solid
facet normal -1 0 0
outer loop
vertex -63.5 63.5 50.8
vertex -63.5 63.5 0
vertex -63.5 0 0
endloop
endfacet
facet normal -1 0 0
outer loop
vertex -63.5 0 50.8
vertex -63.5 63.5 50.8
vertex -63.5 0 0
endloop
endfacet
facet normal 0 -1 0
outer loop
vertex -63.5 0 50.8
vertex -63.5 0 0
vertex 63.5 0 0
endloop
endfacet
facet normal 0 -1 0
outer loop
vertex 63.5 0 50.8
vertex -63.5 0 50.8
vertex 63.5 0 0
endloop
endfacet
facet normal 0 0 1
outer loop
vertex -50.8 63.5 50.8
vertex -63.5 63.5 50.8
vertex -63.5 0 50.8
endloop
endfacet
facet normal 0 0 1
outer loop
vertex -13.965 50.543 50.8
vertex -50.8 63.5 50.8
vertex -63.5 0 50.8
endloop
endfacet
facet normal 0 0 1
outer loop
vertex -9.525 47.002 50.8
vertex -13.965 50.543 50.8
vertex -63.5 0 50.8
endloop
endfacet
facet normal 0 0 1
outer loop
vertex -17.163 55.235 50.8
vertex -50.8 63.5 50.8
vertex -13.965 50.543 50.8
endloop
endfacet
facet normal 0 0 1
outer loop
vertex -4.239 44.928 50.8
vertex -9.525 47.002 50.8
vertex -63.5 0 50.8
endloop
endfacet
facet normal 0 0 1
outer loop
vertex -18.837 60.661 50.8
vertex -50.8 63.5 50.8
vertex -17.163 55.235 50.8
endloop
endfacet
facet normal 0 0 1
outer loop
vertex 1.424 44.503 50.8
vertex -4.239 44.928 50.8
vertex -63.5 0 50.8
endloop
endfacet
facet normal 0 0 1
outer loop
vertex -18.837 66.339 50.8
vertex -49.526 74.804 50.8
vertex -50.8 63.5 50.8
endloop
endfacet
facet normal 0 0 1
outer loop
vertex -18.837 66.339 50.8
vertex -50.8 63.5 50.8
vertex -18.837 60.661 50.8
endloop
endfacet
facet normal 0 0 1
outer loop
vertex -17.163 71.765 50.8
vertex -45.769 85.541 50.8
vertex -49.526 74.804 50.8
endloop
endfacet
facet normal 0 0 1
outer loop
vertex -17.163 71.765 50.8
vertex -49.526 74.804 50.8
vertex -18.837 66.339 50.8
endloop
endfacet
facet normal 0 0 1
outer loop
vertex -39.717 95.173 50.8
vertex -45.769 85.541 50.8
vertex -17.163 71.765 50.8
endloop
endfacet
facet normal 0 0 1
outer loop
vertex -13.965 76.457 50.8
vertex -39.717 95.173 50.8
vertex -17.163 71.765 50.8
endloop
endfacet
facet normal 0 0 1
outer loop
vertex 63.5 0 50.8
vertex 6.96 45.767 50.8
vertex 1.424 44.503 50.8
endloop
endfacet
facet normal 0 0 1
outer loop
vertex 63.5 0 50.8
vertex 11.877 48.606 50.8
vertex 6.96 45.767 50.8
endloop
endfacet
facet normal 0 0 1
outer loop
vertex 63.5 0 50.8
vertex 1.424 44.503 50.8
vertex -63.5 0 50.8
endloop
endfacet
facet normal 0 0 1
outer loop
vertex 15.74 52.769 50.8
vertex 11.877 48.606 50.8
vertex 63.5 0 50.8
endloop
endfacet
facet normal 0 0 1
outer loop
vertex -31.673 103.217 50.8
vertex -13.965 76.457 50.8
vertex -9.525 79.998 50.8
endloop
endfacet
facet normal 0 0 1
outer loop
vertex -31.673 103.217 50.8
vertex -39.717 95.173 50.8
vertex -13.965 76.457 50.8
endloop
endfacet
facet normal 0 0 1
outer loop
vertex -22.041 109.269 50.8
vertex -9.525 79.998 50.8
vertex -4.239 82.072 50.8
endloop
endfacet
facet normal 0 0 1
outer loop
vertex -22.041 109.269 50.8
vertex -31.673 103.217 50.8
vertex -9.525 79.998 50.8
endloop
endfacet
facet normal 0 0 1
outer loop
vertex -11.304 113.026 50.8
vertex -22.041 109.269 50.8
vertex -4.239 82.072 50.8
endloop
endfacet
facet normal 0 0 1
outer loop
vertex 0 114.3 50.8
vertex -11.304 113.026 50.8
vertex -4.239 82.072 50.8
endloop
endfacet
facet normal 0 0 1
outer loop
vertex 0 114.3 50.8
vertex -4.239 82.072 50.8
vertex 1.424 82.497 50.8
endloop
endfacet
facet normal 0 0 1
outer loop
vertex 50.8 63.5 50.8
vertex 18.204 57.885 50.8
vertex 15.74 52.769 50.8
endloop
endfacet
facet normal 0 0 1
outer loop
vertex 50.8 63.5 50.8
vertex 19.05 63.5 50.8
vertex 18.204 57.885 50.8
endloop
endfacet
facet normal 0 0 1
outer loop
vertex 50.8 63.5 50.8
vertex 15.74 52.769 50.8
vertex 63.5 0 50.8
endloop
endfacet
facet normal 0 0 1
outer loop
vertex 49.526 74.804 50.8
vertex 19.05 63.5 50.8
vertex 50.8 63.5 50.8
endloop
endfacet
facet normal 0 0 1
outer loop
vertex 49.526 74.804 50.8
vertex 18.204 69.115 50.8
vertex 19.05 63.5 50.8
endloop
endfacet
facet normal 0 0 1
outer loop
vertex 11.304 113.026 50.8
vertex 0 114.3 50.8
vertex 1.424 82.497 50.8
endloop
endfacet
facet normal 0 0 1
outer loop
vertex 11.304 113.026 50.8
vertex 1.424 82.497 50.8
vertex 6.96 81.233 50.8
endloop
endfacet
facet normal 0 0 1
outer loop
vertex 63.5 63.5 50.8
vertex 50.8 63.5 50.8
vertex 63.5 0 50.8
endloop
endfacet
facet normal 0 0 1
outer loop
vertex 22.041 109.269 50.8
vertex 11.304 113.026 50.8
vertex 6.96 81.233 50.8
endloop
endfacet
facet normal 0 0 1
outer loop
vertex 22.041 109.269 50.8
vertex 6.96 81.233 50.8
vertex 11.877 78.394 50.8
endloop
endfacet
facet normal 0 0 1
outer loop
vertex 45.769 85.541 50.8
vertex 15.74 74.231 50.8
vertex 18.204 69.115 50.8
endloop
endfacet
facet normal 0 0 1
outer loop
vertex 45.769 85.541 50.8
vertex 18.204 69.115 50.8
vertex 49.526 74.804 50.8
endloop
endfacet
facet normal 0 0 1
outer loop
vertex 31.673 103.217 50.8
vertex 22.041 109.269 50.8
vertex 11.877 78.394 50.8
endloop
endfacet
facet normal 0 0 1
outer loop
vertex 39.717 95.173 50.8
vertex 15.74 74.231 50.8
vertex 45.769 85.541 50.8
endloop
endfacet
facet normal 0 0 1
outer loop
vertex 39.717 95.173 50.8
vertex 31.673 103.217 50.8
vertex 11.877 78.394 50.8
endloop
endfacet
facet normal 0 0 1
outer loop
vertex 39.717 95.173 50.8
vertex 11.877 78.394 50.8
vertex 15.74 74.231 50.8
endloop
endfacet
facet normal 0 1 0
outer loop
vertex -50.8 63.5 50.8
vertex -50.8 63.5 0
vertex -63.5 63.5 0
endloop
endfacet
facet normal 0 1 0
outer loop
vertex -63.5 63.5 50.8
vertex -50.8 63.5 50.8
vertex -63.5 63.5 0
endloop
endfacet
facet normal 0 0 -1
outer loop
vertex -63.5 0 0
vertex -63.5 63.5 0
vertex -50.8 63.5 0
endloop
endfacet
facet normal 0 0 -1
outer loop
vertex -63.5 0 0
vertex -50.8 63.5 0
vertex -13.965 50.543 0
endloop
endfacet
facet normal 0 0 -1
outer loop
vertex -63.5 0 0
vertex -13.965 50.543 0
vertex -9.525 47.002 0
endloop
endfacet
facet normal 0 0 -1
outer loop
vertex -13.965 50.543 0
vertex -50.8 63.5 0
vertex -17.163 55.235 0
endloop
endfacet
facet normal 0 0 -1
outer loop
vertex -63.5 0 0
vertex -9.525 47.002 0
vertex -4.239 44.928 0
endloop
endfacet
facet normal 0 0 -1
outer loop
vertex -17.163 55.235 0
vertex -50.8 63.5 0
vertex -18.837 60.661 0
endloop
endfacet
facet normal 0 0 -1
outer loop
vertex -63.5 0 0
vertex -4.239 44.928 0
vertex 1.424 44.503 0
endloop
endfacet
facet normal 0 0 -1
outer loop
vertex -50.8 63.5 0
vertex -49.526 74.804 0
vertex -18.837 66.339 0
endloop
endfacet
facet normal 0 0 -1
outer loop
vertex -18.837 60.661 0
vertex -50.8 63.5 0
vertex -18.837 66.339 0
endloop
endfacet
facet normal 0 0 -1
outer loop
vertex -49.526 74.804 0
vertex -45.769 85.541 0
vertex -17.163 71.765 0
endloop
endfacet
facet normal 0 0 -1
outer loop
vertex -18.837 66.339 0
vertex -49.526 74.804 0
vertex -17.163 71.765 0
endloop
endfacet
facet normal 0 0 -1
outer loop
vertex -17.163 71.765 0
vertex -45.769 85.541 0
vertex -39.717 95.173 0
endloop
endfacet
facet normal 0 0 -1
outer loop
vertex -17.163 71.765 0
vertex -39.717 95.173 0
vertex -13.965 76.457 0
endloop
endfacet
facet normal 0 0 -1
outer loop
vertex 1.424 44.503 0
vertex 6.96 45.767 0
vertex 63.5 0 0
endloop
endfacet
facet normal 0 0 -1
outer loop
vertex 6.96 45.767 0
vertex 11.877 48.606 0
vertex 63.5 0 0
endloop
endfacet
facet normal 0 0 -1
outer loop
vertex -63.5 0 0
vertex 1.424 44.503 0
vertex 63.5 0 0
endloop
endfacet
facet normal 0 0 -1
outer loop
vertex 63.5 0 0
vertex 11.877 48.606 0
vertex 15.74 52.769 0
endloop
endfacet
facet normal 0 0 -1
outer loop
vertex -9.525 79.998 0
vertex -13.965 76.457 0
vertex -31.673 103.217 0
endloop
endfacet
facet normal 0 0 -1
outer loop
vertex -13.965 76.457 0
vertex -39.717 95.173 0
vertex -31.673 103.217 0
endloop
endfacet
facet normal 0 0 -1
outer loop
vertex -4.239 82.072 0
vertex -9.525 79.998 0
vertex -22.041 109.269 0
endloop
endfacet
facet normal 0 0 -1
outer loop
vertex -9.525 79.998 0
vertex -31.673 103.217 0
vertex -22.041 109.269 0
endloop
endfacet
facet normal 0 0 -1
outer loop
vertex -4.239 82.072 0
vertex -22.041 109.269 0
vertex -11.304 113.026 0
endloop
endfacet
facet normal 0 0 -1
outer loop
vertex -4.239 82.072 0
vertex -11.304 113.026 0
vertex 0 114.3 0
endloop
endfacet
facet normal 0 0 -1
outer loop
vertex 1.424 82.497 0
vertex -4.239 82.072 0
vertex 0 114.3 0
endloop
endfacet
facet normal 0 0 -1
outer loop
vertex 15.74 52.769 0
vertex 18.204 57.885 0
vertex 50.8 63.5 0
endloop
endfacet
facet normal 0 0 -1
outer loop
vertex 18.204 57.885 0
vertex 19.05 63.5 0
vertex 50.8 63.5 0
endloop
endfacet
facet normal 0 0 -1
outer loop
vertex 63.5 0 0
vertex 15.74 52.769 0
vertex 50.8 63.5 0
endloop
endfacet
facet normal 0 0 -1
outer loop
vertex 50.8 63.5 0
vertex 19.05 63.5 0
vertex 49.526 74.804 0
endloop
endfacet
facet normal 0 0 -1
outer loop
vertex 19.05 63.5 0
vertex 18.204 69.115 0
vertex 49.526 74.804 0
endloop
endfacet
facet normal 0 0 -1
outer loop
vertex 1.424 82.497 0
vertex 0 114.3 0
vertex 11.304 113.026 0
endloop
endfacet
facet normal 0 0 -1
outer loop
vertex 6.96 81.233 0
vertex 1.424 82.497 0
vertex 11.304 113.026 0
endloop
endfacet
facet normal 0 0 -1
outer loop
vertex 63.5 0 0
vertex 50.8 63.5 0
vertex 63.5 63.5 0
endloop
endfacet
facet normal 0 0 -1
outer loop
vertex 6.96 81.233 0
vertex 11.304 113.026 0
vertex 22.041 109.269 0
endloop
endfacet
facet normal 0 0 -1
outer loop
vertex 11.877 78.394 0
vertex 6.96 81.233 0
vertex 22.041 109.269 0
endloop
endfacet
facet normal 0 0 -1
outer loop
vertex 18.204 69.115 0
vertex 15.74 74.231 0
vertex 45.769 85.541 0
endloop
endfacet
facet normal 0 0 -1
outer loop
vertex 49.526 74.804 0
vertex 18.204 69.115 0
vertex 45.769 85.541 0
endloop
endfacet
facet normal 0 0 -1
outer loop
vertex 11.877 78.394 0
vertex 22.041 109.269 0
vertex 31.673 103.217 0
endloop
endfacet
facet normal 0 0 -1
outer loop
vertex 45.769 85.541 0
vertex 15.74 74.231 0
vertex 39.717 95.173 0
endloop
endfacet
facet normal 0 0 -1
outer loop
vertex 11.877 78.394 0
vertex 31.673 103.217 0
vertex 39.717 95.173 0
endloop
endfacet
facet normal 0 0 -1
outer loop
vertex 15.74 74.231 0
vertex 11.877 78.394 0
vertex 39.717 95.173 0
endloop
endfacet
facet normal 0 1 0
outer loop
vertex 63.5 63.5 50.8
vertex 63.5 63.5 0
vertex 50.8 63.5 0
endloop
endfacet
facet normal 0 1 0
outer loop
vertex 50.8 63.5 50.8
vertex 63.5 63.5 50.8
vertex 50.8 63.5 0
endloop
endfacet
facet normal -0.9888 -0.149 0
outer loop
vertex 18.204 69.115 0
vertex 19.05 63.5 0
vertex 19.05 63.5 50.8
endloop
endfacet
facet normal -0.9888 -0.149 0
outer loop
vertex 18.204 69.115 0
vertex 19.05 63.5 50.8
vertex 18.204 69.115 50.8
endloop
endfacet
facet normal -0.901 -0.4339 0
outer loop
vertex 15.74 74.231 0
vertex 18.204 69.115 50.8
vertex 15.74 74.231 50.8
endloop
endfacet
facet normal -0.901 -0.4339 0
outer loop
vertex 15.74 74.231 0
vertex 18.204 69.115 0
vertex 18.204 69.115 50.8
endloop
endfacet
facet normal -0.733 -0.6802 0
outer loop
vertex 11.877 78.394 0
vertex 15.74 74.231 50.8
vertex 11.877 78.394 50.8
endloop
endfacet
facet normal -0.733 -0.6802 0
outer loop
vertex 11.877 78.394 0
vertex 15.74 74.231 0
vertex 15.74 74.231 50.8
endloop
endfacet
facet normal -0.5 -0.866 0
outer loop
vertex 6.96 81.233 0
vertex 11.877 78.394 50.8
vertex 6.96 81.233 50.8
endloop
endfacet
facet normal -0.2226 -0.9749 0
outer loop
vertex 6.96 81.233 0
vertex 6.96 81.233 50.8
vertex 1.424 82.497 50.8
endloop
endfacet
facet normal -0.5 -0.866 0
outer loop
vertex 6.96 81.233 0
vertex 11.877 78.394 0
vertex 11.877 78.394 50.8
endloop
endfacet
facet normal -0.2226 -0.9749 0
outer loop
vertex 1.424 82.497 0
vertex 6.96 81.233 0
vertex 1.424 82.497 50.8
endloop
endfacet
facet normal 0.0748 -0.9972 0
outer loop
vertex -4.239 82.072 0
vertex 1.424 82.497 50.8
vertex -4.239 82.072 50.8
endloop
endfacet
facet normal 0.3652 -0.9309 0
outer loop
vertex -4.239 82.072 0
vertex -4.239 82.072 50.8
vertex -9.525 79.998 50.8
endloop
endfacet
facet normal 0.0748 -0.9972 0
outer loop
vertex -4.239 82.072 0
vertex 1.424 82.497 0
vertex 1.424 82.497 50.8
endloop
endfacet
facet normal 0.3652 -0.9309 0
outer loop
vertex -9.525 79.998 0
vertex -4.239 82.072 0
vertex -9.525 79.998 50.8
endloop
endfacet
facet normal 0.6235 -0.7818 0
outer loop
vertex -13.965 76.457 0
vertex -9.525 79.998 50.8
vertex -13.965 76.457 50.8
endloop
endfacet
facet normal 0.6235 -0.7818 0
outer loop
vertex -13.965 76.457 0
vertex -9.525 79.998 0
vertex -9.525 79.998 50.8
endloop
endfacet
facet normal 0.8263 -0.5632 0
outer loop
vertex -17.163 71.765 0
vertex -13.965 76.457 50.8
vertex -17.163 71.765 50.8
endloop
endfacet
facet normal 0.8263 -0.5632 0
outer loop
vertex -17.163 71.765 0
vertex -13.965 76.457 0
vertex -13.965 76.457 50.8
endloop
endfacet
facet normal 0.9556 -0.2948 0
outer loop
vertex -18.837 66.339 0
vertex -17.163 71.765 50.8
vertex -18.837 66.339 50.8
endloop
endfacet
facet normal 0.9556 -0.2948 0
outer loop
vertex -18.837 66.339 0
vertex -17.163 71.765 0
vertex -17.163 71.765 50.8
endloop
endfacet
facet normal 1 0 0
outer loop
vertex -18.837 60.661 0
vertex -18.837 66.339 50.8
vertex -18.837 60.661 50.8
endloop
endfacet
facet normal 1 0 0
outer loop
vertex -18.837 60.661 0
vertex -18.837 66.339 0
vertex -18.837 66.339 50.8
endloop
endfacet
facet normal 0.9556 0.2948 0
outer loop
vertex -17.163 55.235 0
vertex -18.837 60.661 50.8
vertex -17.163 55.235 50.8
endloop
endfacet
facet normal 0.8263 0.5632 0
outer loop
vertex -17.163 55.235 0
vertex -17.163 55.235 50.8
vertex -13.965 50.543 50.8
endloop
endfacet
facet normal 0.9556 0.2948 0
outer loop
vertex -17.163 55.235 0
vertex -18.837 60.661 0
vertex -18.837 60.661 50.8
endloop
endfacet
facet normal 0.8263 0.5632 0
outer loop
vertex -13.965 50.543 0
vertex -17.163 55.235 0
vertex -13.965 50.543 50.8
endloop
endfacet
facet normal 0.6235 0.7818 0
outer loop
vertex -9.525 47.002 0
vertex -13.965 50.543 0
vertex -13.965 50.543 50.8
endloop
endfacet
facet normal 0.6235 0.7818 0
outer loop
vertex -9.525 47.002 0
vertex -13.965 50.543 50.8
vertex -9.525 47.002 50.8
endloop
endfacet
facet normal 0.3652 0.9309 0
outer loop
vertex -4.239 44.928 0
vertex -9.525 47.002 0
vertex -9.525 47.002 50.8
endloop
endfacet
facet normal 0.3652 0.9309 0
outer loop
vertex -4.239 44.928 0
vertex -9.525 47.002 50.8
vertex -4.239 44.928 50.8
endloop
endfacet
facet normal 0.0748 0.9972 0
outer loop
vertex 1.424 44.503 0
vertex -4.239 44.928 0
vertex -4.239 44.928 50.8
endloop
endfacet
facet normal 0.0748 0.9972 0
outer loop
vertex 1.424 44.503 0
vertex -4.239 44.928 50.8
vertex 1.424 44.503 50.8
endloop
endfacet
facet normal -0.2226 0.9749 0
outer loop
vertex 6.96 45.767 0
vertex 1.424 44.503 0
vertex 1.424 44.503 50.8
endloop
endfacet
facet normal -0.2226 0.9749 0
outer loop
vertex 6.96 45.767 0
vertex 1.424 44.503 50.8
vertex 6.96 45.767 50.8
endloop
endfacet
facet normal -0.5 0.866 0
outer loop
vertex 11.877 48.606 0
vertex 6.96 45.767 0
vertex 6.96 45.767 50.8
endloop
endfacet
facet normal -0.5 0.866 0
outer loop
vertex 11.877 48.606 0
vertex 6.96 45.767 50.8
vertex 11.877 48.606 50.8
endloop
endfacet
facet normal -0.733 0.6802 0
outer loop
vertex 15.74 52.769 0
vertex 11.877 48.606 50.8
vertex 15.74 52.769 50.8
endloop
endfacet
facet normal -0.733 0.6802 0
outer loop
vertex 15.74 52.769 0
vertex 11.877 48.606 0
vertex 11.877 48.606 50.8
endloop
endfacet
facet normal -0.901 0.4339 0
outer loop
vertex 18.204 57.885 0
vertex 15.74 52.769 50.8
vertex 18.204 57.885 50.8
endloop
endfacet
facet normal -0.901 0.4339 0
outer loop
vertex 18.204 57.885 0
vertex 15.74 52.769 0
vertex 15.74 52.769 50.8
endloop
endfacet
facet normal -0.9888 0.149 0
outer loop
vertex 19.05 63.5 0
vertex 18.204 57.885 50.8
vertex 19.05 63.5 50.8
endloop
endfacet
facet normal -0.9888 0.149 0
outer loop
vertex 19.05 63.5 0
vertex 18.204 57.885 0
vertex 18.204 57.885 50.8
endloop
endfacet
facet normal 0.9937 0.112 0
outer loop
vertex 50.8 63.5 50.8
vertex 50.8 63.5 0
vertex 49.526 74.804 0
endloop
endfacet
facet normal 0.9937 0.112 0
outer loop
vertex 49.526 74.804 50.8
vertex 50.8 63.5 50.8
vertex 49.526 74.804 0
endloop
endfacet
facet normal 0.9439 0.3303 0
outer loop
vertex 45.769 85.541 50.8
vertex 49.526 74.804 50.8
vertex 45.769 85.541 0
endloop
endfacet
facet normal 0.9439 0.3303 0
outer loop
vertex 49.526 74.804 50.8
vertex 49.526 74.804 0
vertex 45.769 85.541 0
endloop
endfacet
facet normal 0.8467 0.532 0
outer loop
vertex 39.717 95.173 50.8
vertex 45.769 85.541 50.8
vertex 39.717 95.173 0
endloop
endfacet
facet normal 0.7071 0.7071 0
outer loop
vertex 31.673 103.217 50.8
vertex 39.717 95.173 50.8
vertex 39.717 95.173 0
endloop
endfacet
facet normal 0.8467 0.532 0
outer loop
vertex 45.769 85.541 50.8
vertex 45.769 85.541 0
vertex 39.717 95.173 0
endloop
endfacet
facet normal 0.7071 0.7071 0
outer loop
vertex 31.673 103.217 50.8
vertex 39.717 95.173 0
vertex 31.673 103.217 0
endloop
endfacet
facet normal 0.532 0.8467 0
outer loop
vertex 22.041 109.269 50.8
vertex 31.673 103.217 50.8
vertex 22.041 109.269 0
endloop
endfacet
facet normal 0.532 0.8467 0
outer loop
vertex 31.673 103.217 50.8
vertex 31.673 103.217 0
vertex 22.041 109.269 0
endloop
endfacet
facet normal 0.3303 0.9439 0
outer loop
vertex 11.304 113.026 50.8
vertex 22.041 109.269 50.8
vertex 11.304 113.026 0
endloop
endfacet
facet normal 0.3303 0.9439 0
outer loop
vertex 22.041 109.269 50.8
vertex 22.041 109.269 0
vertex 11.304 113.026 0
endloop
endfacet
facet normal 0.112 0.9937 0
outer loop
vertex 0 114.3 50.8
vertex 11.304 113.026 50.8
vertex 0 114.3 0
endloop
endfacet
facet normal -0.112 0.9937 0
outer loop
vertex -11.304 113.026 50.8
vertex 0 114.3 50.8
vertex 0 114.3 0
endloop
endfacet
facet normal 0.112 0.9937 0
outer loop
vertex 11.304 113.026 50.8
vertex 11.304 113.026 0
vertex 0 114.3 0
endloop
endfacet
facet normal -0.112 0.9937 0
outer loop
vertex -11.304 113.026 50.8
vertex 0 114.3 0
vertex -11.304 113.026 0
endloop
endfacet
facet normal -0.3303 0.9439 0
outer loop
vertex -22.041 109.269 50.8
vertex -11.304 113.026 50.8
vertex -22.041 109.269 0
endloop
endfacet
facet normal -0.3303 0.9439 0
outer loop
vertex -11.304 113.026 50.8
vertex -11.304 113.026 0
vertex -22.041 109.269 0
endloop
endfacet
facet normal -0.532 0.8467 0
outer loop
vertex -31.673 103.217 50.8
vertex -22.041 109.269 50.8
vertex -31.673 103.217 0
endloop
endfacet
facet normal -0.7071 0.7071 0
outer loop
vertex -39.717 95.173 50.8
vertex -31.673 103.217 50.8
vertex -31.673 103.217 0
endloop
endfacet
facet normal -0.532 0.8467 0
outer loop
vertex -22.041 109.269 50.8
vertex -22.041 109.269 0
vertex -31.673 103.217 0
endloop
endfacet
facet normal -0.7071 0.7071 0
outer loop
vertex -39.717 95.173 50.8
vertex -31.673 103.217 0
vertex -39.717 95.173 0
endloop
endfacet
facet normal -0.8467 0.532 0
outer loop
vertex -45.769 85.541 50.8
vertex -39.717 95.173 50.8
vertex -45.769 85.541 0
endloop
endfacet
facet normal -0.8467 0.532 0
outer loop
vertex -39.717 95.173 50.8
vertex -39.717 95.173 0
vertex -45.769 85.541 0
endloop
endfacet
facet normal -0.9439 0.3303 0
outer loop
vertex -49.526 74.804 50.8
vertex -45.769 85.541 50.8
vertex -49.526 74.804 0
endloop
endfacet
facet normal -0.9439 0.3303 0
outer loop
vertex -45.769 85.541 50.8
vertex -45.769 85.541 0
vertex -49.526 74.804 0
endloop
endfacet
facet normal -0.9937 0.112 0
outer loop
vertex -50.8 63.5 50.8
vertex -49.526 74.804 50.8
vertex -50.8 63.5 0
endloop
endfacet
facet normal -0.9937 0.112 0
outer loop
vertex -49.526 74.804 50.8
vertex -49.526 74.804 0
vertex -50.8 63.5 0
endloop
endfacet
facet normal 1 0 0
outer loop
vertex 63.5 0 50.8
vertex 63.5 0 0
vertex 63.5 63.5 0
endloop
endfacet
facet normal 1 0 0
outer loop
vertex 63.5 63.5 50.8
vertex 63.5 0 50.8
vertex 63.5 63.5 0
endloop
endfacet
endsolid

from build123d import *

# Parameters (mm, degrees)
SKETCH1_R           = 19.05
BOSS_EXTRUDE1_DEPTH = 50.8


with BuildPart() as part:
    # Sketch1 → Boss-Extrude1 (new body)
    with BuildSketch(Plane.XY):
        with BuildLine():
            Line((-63.5, 0), (63.5, 0))
            Line((63.5, 0), (63.5, 63.5))
            Line((63.5, 63.5), (50.8, 63.5))
            ThreePointArc((50.8, 63.5), (0, 114.3), (-50.8, 63.5))
            Line((-50.8, 63.5), (-63.5, 63.5))
            Line((-63.5, 63.5), (-63.5, 0))
        make_face()
        with Locations((0, 63.5)):
            Circle(SKETCH1_R, mode=Mode.SUBTRACT)
    extrude(amount=BOSS_EXTRUDE1_DEPTH)


solid = part.part
